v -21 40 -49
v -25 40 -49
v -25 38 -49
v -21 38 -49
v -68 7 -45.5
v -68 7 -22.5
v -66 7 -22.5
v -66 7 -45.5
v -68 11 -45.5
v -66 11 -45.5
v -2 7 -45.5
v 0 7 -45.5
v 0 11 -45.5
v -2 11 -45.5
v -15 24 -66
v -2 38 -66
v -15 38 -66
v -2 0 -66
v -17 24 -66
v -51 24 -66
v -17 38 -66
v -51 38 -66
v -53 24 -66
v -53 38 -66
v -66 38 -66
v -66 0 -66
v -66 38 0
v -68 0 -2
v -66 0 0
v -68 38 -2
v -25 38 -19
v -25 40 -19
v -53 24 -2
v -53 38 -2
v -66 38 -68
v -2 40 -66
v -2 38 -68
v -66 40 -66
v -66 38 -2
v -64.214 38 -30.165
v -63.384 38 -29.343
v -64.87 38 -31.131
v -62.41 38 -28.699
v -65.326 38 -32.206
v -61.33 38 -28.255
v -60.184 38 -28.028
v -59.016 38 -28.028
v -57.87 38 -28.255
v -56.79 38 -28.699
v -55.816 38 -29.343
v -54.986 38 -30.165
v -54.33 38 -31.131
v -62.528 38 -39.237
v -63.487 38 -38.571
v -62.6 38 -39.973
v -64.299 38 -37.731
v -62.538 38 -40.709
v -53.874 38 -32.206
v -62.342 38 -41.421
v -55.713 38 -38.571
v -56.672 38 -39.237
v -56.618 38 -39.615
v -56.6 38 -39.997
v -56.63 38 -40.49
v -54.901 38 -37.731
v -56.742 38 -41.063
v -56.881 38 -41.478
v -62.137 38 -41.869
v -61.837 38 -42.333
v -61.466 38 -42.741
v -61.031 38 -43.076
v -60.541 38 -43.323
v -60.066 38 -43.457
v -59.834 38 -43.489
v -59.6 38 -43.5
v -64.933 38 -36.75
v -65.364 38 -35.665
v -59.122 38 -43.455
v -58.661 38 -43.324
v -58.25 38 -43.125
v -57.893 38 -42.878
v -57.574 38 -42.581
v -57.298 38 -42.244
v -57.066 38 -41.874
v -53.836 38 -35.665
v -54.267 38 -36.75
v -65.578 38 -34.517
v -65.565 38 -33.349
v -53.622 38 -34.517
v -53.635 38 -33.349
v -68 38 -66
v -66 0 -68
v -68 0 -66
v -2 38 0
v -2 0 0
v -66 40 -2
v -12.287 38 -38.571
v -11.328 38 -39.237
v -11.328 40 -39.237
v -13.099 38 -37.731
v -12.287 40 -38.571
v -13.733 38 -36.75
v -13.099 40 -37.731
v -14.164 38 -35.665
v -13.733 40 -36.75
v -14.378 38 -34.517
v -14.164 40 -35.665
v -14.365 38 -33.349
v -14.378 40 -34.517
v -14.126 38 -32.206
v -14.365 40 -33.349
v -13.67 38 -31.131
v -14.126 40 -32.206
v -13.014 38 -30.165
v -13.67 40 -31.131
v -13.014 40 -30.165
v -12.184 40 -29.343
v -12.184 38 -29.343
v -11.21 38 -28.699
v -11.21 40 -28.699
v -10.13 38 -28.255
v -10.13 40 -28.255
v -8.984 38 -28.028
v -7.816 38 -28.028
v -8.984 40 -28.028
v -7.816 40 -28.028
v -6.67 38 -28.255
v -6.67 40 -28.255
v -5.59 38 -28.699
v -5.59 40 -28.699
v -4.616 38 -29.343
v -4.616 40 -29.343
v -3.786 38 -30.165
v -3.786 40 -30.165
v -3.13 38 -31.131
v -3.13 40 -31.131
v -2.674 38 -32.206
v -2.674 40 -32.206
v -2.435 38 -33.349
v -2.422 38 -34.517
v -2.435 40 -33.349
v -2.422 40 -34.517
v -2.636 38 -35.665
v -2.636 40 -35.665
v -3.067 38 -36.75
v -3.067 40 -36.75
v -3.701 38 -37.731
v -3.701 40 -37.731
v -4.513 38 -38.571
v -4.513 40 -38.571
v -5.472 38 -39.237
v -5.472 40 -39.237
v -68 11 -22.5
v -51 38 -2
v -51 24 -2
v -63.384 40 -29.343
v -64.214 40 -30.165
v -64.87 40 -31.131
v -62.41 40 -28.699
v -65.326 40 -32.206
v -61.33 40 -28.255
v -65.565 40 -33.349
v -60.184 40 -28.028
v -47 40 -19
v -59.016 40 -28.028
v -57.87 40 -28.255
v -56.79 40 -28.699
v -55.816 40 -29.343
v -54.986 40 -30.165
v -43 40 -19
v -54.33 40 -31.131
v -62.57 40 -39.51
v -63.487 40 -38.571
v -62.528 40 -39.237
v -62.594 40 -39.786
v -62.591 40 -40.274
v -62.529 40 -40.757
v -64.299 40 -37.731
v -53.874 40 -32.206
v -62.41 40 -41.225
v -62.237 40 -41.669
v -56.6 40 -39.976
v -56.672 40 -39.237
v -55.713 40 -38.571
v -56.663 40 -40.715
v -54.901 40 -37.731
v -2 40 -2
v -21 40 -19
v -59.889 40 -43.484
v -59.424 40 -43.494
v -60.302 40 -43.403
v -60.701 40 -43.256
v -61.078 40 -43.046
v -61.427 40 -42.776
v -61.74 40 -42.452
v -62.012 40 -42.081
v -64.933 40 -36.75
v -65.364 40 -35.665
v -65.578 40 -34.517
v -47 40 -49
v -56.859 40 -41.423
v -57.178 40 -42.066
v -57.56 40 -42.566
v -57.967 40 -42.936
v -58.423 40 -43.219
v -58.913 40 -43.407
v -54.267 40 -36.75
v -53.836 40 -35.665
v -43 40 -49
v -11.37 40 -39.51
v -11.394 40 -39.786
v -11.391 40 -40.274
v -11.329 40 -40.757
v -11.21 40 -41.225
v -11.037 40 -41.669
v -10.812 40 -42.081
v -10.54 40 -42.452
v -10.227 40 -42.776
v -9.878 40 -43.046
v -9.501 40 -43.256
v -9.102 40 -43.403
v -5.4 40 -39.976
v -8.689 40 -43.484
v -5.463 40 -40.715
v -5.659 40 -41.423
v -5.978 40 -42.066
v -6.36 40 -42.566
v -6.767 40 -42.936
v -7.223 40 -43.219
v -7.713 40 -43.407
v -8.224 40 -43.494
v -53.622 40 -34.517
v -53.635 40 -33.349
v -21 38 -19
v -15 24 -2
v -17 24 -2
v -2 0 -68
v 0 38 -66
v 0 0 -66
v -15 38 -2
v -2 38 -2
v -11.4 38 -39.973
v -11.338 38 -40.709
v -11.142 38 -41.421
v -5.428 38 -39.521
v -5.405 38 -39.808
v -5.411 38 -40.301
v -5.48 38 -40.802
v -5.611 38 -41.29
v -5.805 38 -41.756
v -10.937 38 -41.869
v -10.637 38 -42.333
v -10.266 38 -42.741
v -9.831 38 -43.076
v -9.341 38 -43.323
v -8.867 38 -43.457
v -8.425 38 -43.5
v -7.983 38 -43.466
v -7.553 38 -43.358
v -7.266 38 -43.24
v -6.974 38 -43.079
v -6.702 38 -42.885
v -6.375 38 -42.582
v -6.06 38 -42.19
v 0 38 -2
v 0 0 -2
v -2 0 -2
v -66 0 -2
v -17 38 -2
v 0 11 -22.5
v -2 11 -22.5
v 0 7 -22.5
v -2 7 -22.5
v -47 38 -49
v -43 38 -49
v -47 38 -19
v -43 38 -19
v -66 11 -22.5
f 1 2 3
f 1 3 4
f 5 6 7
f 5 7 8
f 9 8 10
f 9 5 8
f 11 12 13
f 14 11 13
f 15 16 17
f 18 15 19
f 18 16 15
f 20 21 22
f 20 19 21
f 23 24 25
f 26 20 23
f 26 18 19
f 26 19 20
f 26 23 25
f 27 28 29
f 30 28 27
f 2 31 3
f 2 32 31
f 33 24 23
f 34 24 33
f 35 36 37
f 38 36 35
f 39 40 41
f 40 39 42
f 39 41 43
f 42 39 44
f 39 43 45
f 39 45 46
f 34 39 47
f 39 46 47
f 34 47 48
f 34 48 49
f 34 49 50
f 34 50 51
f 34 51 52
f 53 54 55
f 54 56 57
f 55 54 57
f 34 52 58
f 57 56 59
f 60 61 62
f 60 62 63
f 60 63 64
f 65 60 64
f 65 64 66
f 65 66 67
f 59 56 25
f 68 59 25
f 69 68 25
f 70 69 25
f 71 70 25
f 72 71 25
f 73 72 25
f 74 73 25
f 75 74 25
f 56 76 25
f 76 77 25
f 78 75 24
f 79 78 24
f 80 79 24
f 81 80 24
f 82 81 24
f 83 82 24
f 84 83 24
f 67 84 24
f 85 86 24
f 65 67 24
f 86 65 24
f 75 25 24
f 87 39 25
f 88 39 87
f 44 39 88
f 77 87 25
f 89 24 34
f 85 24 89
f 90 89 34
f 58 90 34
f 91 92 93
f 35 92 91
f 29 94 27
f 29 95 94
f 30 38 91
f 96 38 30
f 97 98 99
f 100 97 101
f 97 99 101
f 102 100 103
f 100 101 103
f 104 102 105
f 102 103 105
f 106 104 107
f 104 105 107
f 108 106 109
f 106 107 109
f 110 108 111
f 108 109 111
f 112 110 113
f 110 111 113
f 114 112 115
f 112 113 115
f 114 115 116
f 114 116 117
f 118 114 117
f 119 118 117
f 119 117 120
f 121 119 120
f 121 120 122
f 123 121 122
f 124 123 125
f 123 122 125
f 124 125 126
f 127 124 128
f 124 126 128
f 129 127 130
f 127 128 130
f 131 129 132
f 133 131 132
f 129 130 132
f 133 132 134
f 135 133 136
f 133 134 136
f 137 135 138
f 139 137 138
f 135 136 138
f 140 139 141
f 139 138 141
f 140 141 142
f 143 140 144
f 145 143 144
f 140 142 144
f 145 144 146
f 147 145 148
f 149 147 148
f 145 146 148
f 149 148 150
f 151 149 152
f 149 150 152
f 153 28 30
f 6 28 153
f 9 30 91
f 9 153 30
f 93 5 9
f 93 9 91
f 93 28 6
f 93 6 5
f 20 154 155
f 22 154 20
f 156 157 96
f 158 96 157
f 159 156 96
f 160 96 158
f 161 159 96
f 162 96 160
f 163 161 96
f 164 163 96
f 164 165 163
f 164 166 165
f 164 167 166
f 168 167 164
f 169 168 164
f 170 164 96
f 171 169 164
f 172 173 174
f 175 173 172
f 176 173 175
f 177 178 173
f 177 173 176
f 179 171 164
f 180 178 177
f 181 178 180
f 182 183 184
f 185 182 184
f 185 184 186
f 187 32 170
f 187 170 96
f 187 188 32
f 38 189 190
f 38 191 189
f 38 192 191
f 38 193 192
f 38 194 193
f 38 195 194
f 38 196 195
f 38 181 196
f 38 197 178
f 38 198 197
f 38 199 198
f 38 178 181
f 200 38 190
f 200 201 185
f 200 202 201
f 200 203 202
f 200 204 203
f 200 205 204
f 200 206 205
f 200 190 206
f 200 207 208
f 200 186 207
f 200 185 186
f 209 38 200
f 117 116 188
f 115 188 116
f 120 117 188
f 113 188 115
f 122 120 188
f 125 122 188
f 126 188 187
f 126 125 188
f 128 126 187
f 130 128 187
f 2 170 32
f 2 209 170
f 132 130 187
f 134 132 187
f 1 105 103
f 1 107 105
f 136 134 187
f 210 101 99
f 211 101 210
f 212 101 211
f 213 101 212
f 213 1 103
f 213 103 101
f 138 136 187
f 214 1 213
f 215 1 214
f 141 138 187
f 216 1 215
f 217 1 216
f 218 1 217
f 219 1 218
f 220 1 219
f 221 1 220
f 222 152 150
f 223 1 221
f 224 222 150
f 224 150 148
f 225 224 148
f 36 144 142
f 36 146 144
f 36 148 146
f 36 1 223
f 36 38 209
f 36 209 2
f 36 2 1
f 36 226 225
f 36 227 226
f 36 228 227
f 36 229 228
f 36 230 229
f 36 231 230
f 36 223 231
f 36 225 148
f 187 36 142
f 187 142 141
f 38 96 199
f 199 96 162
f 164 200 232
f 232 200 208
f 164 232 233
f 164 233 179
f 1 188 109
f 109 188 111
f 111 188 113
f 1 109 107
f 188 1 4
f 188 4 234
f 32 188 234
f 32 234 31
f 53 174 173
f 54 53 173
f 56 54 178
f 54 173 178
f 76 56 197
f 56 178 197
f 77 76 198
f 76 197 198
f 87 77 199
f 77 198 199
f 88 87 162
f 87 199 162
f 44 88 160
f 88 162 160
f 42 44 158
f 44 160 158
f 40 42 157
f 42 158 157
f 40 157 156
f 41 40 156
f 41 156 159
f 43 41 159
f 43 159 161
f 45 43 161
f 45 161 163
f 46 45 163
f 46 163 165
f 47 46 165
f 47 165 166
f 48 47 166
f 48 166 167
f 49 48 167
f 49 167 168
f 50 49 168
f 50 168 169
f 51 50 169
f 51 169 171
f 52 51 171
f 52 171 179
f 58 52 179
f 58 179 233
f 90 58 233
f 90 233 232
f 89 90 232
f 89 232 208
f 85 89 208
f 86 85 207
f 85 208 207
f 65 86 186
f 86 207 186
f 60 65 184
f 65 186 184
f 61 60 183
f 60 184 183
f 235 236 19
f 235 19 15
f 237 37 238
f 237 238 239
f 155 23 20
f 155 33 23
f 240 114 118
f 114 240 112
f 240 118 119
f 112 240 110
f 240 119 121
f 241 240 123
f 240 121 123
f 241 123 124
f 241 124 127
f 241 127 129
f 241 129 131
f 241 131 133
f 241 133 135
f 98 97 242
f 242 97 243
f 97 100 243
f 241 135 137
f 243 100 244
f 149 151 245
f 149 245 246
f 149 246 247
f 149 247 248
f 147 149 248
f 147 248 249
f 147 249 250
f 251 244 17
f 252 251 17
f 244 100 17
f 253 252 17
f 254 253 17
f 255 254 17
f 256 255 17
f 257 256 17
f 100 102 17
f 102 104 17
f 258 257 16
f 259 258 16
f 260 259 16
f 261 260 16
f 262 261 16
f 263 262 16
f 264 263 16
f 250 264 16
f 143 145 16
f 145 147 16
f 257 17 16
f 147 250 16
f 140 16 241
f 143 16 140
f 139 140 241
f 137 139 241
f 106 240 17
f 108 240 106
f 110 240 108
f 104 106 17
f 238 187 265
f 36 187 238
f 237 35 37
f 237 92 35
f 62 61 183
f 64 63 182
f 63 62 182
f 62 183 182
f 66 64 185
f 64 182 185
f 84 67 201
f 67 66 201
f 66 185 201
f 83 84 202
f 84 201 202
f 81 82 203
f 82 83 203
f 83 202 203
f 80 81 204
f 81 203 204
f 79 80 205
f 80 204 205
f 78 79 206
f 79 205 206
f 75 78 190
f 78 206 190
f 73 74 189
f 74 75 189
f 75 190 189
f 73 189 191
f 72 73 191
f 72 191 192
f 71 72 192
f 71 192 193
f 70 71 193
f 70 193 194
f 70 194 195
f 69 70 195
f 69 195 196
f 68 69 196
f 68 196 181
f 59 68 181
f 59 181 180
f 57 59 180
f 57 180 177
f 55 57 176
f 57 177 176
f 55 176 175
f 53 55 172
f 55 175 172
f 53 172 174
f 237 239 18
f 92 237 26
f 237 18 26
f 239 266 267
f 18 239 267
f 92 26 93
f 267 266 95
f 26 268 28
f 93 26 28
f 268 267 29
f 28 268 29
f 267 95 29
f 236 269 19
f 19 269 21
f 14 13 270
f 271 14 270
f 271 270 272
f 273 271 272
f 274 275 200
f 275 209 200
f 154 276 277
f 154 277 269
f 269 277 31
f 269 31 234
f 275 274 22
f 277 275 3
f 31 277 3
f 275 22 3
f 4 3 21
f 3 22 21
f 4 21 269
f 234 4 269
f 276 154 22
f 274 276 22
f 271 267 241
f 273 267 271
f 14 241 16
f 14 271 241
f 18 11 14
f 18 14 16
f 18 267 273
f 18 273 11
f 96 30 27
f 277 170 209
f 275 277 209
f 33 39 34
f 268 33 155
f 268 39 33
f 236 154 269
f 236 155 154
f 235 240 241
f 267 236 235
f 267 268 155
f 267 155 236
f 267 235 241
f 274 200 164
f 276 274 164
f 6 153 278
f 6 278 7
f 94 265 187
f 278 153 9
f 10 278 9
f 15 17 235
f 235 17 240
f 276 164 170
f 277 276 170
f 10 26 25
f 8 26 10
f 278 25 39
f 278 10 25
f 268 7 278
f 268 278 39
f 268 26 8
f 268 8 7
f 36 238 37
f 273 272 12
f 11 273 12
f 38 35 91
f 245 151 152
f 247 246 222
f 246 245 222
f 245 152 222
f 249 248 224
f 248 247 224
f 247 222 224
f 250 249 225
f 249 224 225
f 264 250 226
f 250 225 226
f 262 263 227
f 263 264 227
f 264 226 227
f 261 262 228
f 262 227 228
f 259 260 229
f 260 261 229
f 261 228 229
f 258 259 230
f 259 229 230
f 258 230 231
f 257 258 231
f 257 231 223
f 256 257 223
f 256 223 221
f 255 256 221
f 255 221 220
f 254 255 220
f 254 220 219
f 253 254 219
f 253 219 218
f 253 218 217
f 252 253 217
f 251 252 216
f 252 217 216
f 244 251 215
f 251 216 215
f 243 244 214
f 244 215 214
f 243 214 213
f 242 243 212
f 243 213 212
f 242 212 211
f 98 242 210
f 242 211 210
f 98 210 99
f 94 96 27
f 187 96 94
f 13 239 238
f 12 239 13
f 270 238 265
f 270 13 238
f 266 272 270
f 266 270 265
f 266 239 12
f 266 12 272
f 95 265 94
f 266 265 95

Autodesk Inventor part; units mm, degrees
ref_plane "YZ Plane" through (0, 0, 0) normal (1, 0, 0) x (0, 1, 0)
ref_plane "XZ Plane" through (0, 0, 0) normal (0, 1, 0) x (-1, 0, 0)
ref_plane "XY Plane" through (0, 0, 0) normal (0, 0, 1) x (1, 0, 0)
sketch "Esboço1" plane through (0, 0, 0) normal (0, 1, 0) x (-1, 0, 0)
  line L0 (0, 0) -> (68, 0)
  line L1 (68, 0) -> (68, -68)
  line L2 (68, -68) -> (0, -68)
  line L3 (0, -68) -> (0, 0)
  line L4 (66, -2) -> (2, -2)
  line L5 (2, -2) -> (2, -66)
  line L6 (2, -66) -> (66, -66)
  line L7 (66, -66) -> (66, -2)
  dimension "d0" = 68
  dimension "d1" = 68
  dimension "d2" = 2
  dimension "d3" = 2
  dimension "d4" = 2
  dimension "d5" = 2
extrude "Extrusão1" add sketch "Esboço1" along normal blind 38
sketch "Esboço2" plane through (0, 38, 0) normal (0, 1, 0) x (1, 0, 0)
  line L0 (-68, 68) -> (0, 68) projected
  line L1 (0, 0) -> (-68, 0)
  line L2 (-68, 0) -> (-68, 68)
  line L3 (-68, 68) -> (0, 68)
  line L4 (0, 68) -> (0, 0)
extrude "Extrusão2" add sketch "Esboço2" along normal blind 2
chamfer "Chanfro1" distance 2 angle 45 8 edges at (-68, 20, -68) (0, 20, -68) (-68, 20, 0) (0, 20, 0) (0, 40, -34) (-34, 40, -68) (-68, 40, -34) (-34, 40, 0)
sketch "Esboço3" plane through (0, 0, -2) normal (1, 0, 0) x (0, 0, -1)
  line L0 (64, 0) -> (0, 0) construction
  line L1 (32, 11) -> (32, 0) construction
  line L2 (43.5, 11) -> (20.5, 11)
  line L3 (20.5, 11) -> (20.5, 7)
  line L4 (20.5, 7) -> (43.5, 7)
  line L5 (43.5, 7) -> (43.5, 11)
  point P0 (-2, 0)
  dimension "d16" = 4
  dimension "d17" = 11
  dimension "d18" = 23
extrude "Extrusão3" cut sketch "Esboço3" against normal blind 4
sketch "Esboço4" plane through (-68, 0, -66) normal (-1, 0, 0) x (0, 0, 1)
  line L0 (43.5, 11) -> (20.5, 11) projected
  line L1 (43.5, 7) -> (20.5, 7)
  line L2 (20.5, 7) -> (20.5, 11)
  line L3 (20.5, 11) -> (43.5, 11)
  line L4 (43.5, 11) -> (43.5, 7)
  point P0 (66, 0)
extrude "Extrusão4" cut sketch "Esboço4" against normal blind 4
sketch "Esboço5" plane through (0, 40, 0) normal (0, 1, 0) x (1, 0, 0)
  line L0 (-34, 66) -> (-34, 2) construction
  line L1 (-43, 49) -> (-47, 49)
  line L2 (-47, 49) -> (-47, 19)
  line L3 (-47, 19) -> (-43, 19)
  line L4 (-43, 19) -> (-43, 49)
  line L5 (-43, 34) -> (-61.5633, 34) construction
  line L6 (-66, 2) -> (-66, 66) construction
  arc A0 (-62.5279, 39.2371) -> (-56.6721, 39.2371) centre (-59.6, 34) ccw
  ellipse E0 centre (-59.6, 40) end of major axis (-56.6, 40) minor radius 3.5 (-56.6721, 39.2371) -> (-62.5279, 39.2371) ccw
  line L7 (-25, 49) -> (-21, 49)
  line L8 (-21, 49) -> (-21, 19)
  line L9 (-21, 19) -> (-25, 19)
  line L10 (-25, 19) -> (-25, 49)
  arc A1 (-11.3279, 39.2371) -> (-5.4721, 39.2371) centre (-8.4, 34) ccw
  ellipse E1 centre (-8.4, 40) end of major axis (-11.4, 40) minor radius 3.5 (-5.4721, 39.2371) -> (-11.3279, 39.2371) ccw
  point P0 (0, 0)
  dimension "d28" = 3
  dimension "d29" = 3.5
  dimension "d23" = 4
  dimension "d24" = 30
  dimension "d25" = 19
  dimension "d26" = 12
  dimension "d27" = 6.4
extrude "Extrusão5" cut sketch "Esboço5" against normal blind 4
sketch "Esboço6" plane through (0, 38, 0) normal (0, -1, 0) x (1, 0, 0)
  point P0 (0, 0)
sketch "Esboço7" plane through (0, 38, 0) normal (0, -1, 0) x (1, 0, 0)
  line L0 (-15, -2) -> (-17, -2)
  line L1 (-17, -2) -> (-17, -66)
  line L2 (-17, -66) -> (-15, -66)
  line L3 (-15, -66) -> (-15, -2)
  line L4 (-2, -2) -> (-2, -66) projected
  line L5 (-34, -66) -> (-34, -2) construction
  line L6 (-15, -2) -> (-17, -2) construction
  line L7 (-15, -2) -> (-17, -2)
  line L8 (-53, -2) -> (-51, -2)
  line L9 (-51, -2) -> (-51, -66)
  line L10 (-51, -66) -> (-53, -66)
  line L11 (-53, -66) -> (-53, -2)
  point P0 (0, 0)
  dimension "d32" = 2
  dimension "d33" = 13
extrude "Extrusão6" add sketch "Esboço7" along normal blind 14
properties part number "BundOtta"
